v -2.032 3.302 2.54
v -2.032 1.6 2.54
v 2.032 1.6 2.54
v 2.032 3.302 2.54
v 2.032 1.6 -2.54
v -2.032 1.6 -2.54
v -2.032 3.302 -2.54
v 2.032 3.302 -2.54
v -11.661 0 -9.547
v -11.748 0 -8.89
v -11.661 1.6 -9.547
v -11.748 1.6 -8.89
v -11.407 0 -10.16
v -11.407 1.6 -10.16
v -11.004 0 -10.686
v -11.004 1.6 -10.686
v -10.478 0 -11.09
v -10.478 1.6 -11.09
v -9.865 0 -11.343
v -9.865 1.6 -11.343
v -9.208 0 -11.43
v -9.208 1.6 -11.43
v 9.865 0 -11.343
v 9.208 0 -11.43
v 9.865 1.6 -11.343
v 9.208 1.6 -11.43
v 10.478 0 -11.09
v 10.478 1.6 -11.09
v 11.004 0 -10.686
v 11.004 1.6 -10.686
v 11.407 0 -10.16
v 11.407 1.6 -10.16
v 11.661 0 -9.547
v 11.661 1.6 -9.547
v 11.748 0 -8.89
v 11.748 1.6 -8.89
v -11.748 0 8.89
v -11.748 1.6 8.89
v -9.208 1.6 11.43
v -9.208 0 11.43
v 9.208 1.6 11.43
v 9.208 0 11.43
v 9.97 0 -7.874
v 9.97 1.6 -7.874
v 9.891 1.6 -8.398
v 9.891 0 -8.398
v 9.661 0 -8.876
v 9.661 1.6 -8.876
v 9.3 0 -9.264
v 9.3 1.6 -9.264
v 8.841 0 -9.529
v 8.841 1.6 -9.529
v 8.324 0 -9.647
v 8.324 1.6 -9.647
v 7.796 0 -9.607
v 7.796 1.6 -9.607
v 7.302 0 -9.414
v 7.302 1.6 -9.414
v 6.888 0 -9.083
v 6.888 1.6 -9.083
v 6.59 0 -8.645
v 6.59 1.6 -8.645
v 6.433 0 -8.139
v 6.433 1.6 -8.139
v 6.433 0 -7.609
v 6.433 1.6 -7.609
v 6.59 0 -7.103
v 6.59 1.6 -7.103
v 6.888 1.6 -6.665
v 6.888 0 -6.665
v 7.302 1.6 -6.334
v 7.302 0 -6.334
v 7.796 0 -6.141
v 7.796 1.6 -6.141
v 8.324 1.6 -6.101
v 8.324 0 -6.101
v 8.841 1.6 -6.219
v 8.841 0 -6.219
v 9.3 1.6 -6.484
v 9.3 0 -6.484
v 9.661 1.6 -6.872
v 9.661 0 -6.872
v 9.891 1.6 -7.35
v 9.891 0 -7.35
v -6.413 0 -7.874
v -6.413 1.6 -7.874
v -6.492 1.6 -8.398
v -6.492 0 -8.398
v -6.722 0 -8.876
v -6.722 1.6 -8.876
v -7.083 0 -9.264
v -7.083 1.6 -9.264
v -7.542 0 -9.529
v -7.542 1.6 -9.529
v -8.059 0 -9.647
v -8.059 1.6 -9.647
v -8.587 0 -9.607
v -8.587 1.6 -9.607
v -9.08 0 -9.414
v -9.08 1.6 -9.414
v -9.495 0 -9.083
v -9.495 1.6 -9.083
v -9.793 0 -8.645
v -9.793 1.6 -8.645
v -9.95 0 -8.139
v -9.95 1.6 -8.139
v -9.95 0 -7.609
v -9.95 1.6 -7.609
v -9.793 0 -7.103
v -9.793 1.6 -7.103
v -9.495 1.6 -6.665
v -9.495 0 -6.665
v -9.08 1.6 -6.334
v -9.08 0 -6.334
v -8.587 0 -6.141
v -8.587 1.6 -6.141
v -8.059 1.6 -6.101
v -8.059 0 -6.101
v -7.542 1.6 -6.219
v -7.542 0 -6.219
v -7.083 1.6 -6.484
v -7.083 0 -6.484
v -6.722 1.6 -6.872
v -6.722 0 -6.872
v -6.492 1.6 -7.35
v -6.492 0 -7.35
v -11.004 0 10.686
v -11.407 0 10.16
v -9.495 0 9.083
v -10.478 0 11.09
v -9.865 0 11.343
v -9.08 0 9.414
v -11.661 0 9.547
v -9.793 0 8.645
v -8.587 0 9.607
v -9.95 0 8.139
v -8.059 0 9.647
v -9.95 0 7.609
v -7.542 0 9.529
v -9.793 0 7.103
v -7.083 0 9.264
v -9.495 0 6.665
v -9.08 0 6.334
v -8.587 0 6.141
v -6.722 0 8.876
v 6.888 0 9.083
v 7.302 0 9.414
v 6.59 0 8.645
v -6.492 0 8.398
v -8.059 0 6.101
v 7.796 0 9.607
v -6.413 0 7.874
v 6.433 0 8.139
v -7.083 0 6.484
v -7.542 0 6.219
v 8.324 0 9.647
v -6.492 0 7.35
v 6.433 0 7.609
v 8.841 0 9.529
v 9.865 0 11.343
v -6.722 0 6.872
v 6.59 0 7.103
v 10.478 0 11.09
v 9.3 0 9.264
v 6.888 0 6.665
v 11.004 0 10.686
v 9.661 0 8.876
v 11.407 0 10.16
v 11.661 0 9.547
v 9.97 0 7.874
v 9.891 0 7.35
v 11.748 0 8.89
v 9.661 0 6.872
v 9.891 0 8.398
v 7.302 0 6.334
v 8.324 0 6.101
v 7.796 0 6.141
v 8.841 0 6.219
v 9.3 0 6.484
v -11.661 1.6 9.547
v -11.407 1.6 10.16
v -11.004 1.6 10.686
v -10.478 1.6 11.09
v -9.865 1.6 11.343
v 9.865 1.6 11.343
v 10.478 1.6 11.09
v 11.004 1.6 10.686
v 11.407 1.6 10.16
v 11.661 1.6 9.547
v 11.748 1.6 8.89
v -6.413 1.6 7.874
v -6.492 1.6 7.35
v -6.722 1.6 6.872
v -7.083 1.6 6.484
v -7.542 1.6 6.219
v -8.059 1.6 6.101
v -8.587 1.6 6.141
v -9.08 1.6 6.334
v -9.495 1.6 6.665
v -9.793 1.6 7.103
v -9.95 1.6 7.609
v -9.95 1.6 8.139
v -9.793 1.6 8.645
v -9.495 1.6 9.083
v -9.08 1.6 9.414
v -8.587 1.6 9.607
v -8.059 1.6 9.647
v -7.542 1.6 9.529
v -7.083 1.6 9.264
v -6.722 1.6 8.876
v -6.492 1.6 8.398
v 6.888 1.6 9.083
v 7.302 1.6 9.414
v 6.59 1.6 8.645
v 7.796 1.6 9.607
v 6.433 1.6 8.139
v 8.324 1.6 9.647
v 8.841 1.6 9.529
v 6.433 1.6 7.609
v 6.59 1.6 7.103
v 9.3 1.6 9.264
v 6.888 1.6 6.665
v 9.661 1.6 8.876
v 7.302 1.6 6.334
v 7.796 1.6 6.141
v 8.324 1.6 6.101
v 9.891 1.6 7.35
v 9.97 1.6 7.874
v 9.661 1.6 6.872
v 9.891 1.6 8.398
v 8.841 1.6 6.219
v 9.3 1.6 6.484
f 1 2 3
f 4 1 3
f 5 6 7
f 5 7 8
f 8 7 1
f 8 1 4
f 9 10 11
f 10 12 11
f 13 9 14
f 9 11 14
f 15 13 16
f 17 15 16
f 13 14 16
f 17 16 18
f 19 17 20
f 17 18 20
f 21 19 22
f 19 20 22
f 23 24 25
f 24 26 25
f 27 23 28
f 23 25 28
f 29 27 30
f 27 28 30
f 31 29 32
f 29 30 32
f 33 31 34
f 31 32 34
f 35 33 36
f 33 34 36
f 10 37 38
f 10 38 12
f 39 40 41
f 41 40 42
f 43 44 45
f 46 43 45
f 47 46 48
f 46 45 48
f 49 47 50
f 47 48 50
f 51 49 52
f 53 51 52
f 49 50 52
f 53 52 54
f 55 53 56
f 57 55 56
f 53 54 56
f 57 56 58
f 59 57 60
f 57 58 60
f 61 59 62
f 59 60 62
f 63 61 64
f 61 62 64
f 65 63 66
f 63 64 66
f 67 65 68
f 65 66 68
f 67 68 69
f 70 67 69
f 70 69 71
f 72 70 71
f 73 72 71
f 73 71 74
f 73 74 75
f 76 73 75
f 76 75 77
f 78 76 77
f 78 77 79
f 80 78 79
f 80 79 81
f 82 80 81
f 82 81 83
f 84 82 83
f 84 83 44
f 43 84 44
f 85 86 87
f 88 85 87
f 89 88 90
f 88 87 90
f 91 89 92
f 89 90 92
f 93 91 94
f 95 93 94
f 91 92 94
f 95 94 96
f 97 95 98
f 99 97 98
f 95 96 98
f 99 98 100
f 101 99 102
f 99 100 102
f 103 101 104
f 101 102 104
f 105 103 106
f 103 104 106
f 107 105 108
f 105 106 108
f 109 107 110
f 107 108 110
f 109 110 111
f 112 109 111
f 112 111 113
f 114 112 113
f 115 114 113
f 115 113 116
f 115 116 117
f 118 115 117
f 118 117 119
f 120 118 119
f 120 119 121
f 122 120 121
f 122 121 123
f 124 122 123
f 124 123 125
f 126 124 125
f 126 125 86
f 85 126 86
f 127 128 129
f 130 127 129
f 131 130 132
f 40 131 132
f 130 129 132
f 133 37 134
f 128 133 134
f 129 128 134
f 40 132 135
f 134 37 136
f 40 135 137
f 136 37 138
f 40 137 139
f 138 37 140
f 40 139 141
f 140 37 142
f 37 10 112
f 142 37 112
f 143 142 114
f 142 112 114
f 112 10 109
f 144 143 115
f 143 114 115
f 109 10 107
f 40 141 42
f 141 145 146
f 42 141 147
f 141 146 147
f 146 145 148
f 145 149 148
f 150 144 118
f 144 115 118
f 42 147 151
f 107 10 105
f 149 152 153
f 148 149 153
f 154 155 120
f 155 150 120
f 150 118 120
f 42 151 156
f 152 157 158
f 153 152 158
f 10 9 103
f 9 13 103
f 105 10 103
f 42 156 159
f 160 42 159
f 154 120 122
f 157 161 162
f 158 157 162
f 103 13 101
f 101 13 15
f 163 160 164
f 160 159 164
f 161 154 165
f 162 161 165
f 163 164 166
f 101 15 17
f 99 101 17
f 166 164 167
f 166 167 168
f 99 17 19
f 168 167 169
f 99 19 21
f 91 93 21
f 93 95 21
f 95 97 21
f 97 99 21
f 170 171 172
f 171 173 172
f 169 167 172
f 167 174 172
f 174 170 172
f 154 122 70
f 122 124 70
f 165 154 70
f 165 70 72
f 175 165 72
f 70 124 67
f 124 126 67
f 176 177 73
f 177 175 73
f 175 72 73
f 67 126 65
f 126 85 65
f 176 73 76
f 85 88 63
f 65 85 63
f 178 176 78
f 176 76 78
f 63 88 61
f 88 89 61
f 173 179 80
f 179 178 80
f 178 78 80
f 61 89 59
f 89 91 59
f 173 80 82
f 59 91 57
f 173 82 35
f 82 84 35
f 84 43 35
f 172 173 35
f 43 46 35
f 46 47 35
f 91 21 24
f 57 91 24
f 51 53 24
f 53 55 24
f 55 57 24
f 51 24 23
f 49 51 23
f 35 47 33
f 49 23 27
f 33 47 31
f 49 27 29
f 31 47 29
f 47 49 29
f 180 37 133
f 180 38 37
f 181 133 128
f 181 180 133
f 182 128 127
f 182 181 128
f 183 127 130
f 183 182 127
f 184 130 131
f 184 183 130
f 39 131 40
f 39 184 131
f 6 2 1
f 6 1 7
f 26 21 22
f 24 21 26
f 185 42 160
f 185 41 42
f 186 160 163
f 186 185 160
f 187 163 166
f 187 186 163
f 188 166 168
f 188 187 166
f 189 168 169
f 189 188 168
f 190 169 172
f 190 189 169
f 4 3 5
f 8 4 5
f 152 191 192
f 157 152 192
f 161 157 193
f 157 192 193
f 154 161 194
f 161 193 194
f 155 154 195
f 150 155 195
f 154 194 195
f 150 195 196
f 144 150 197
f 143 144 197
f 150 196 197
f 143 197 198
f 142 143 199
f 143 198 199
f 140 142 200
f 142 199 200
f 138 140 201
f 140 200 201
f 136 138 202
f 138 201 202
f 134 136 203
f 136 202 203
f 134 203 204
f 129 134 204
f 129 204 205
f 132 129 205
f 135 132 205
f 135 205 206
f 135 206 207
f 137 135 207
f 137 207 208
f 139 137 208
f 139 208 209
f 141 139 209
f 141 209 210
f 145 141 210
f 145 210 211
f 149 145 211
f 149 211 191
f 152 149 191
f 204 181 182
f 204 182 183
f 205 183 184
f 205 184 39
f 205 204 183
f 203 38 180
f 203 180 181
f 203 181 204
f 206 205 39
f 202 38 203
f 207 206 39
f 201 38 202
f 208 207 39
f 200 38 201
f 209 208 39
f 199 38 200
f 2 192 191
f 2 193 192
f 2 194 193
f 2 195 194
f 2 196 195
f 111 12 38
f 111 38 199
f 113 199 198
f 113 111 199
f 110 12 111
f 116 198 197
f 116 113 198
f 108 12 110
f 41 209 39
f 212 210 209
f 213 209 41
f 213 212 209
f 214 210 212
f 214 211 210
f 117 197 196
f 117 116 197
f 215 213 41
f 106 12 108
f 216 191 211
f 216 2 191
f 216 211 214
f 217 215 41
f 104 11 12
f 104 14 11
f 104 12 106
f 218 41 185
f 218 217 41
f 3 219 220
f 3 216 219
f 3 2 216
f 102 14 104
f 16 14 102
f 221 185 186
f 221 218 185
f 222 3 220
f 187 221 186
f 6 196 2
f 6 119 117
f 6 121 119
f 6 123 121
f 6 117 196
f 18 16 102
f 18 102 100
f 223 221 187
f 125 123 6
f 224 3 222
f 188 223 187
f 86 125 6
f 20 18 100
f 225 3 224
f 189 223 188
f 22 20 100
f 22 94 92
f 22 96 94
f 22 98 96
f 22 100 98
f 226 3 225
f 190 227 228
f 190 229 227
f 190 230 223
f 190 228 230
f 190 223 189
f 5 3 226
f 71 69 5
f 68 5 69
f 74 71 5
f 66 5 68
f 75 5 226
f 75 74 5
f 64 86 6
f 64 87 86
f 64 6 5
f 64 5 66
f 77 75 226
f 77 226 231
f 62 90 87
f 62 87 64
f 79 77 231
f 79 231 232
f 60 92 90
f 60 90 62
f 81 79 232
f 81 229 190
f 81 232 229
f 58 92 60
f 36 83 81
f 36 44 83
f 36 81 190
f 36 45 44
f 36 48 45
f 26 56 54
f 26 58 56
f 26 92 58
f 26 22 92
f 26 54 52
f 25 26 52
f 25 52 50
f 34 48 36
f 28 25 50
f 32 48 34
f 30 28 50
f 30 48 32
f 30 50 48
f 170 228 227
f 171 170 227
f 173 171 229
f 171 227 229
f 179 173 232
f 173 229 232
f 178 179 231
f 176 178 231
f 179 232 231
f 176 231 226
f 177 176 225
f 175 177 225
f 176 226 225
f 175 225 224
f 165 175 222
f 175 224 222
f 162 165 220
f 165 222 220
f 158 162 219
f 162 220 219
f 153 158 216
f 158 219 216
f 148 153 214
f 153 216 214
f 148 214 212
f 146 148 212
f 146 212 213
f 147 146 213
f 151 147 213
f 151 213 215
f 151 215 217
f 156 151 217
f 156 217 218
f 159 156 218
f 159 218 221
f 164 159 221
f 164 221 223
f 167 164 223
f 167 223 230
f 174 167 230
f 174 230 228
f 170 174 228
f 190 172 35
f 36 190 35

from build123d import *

# Parameters (mm, degrees)
SKETCH1_W           = 23.495
SKETCH1_H           = 22.86
BOSS_EXTRUDE1_DEPTH = 1.6002
SKETCH2_W           = 4.064
SKETCH2_H           = 5.08
BOSS_EXTRUDE2_DEPTH = 1.7018
FILLET1_R           = 2.54
SKETCH4_R           = 1.778
CUT_EXTRUDE1_DEPTH  = 2.6002


with BuildPart() as part:
    # Sketch1 → Boss-Extrude1 (new body)
    with BuildSketch(Plane(origin=(0, 0, 0), x_dir=(1, 0, 0), z_dir=(0, 1, 0))):
        Rectangle(SKETCH1_W, SKETCH1_H)
    extrude(amount=BOSS_EXTRUDE1_DEPTH)

    # Sketch2 → Boss-Extrude2 (add)
    with BuildSketch(Plane(origin=(0, 1.6002, 0), x_dir=(1, 0, 0), z_dir=(0, 1, 0))):
        Rectangle(SKETCH2_W, SKETCH2_H)
    extrude(amount=BOSS_EXTRUDE2_DEPTH)

    # Fillet1
    fillet1_edges = [part.edges().sort_by_distance(p)[0] for p in [
        (11.7475, 0.8001, 11.43),
        (-11.7475, 0.8001, 11.43),
        (-11.7475, 0.8001, -11.43),
        (11.7475, 0.8001, -11.43),
    ]]
    fillet(fillet1_edges, radius=FILLET1_R)

    # Sketch4 → Cut-Extrude1 (cut, through all)
    with BuildSketch(Plane(origin=(0, 1.6002, 0), x_dir=(1, 0, 0), z_dir=(0, 1, 0))):
        with Locations((-8.1915, -7.874)):
            Circle(SKETCH4_R)
        with Locations((-8.1915, 7.874)):
            Circle(SKETCH4_R)
        with Locations((8.1915, 7.874)):
            Circle(SKETCH4_R)
        with Locations((8.1915, -7.874)):
            Circle(SKETCH4_R)
    extrude(amount=-CUT_EXTRUDE1_DEPTH, mode=Mode.SUBTRACT)


solid = part.part
